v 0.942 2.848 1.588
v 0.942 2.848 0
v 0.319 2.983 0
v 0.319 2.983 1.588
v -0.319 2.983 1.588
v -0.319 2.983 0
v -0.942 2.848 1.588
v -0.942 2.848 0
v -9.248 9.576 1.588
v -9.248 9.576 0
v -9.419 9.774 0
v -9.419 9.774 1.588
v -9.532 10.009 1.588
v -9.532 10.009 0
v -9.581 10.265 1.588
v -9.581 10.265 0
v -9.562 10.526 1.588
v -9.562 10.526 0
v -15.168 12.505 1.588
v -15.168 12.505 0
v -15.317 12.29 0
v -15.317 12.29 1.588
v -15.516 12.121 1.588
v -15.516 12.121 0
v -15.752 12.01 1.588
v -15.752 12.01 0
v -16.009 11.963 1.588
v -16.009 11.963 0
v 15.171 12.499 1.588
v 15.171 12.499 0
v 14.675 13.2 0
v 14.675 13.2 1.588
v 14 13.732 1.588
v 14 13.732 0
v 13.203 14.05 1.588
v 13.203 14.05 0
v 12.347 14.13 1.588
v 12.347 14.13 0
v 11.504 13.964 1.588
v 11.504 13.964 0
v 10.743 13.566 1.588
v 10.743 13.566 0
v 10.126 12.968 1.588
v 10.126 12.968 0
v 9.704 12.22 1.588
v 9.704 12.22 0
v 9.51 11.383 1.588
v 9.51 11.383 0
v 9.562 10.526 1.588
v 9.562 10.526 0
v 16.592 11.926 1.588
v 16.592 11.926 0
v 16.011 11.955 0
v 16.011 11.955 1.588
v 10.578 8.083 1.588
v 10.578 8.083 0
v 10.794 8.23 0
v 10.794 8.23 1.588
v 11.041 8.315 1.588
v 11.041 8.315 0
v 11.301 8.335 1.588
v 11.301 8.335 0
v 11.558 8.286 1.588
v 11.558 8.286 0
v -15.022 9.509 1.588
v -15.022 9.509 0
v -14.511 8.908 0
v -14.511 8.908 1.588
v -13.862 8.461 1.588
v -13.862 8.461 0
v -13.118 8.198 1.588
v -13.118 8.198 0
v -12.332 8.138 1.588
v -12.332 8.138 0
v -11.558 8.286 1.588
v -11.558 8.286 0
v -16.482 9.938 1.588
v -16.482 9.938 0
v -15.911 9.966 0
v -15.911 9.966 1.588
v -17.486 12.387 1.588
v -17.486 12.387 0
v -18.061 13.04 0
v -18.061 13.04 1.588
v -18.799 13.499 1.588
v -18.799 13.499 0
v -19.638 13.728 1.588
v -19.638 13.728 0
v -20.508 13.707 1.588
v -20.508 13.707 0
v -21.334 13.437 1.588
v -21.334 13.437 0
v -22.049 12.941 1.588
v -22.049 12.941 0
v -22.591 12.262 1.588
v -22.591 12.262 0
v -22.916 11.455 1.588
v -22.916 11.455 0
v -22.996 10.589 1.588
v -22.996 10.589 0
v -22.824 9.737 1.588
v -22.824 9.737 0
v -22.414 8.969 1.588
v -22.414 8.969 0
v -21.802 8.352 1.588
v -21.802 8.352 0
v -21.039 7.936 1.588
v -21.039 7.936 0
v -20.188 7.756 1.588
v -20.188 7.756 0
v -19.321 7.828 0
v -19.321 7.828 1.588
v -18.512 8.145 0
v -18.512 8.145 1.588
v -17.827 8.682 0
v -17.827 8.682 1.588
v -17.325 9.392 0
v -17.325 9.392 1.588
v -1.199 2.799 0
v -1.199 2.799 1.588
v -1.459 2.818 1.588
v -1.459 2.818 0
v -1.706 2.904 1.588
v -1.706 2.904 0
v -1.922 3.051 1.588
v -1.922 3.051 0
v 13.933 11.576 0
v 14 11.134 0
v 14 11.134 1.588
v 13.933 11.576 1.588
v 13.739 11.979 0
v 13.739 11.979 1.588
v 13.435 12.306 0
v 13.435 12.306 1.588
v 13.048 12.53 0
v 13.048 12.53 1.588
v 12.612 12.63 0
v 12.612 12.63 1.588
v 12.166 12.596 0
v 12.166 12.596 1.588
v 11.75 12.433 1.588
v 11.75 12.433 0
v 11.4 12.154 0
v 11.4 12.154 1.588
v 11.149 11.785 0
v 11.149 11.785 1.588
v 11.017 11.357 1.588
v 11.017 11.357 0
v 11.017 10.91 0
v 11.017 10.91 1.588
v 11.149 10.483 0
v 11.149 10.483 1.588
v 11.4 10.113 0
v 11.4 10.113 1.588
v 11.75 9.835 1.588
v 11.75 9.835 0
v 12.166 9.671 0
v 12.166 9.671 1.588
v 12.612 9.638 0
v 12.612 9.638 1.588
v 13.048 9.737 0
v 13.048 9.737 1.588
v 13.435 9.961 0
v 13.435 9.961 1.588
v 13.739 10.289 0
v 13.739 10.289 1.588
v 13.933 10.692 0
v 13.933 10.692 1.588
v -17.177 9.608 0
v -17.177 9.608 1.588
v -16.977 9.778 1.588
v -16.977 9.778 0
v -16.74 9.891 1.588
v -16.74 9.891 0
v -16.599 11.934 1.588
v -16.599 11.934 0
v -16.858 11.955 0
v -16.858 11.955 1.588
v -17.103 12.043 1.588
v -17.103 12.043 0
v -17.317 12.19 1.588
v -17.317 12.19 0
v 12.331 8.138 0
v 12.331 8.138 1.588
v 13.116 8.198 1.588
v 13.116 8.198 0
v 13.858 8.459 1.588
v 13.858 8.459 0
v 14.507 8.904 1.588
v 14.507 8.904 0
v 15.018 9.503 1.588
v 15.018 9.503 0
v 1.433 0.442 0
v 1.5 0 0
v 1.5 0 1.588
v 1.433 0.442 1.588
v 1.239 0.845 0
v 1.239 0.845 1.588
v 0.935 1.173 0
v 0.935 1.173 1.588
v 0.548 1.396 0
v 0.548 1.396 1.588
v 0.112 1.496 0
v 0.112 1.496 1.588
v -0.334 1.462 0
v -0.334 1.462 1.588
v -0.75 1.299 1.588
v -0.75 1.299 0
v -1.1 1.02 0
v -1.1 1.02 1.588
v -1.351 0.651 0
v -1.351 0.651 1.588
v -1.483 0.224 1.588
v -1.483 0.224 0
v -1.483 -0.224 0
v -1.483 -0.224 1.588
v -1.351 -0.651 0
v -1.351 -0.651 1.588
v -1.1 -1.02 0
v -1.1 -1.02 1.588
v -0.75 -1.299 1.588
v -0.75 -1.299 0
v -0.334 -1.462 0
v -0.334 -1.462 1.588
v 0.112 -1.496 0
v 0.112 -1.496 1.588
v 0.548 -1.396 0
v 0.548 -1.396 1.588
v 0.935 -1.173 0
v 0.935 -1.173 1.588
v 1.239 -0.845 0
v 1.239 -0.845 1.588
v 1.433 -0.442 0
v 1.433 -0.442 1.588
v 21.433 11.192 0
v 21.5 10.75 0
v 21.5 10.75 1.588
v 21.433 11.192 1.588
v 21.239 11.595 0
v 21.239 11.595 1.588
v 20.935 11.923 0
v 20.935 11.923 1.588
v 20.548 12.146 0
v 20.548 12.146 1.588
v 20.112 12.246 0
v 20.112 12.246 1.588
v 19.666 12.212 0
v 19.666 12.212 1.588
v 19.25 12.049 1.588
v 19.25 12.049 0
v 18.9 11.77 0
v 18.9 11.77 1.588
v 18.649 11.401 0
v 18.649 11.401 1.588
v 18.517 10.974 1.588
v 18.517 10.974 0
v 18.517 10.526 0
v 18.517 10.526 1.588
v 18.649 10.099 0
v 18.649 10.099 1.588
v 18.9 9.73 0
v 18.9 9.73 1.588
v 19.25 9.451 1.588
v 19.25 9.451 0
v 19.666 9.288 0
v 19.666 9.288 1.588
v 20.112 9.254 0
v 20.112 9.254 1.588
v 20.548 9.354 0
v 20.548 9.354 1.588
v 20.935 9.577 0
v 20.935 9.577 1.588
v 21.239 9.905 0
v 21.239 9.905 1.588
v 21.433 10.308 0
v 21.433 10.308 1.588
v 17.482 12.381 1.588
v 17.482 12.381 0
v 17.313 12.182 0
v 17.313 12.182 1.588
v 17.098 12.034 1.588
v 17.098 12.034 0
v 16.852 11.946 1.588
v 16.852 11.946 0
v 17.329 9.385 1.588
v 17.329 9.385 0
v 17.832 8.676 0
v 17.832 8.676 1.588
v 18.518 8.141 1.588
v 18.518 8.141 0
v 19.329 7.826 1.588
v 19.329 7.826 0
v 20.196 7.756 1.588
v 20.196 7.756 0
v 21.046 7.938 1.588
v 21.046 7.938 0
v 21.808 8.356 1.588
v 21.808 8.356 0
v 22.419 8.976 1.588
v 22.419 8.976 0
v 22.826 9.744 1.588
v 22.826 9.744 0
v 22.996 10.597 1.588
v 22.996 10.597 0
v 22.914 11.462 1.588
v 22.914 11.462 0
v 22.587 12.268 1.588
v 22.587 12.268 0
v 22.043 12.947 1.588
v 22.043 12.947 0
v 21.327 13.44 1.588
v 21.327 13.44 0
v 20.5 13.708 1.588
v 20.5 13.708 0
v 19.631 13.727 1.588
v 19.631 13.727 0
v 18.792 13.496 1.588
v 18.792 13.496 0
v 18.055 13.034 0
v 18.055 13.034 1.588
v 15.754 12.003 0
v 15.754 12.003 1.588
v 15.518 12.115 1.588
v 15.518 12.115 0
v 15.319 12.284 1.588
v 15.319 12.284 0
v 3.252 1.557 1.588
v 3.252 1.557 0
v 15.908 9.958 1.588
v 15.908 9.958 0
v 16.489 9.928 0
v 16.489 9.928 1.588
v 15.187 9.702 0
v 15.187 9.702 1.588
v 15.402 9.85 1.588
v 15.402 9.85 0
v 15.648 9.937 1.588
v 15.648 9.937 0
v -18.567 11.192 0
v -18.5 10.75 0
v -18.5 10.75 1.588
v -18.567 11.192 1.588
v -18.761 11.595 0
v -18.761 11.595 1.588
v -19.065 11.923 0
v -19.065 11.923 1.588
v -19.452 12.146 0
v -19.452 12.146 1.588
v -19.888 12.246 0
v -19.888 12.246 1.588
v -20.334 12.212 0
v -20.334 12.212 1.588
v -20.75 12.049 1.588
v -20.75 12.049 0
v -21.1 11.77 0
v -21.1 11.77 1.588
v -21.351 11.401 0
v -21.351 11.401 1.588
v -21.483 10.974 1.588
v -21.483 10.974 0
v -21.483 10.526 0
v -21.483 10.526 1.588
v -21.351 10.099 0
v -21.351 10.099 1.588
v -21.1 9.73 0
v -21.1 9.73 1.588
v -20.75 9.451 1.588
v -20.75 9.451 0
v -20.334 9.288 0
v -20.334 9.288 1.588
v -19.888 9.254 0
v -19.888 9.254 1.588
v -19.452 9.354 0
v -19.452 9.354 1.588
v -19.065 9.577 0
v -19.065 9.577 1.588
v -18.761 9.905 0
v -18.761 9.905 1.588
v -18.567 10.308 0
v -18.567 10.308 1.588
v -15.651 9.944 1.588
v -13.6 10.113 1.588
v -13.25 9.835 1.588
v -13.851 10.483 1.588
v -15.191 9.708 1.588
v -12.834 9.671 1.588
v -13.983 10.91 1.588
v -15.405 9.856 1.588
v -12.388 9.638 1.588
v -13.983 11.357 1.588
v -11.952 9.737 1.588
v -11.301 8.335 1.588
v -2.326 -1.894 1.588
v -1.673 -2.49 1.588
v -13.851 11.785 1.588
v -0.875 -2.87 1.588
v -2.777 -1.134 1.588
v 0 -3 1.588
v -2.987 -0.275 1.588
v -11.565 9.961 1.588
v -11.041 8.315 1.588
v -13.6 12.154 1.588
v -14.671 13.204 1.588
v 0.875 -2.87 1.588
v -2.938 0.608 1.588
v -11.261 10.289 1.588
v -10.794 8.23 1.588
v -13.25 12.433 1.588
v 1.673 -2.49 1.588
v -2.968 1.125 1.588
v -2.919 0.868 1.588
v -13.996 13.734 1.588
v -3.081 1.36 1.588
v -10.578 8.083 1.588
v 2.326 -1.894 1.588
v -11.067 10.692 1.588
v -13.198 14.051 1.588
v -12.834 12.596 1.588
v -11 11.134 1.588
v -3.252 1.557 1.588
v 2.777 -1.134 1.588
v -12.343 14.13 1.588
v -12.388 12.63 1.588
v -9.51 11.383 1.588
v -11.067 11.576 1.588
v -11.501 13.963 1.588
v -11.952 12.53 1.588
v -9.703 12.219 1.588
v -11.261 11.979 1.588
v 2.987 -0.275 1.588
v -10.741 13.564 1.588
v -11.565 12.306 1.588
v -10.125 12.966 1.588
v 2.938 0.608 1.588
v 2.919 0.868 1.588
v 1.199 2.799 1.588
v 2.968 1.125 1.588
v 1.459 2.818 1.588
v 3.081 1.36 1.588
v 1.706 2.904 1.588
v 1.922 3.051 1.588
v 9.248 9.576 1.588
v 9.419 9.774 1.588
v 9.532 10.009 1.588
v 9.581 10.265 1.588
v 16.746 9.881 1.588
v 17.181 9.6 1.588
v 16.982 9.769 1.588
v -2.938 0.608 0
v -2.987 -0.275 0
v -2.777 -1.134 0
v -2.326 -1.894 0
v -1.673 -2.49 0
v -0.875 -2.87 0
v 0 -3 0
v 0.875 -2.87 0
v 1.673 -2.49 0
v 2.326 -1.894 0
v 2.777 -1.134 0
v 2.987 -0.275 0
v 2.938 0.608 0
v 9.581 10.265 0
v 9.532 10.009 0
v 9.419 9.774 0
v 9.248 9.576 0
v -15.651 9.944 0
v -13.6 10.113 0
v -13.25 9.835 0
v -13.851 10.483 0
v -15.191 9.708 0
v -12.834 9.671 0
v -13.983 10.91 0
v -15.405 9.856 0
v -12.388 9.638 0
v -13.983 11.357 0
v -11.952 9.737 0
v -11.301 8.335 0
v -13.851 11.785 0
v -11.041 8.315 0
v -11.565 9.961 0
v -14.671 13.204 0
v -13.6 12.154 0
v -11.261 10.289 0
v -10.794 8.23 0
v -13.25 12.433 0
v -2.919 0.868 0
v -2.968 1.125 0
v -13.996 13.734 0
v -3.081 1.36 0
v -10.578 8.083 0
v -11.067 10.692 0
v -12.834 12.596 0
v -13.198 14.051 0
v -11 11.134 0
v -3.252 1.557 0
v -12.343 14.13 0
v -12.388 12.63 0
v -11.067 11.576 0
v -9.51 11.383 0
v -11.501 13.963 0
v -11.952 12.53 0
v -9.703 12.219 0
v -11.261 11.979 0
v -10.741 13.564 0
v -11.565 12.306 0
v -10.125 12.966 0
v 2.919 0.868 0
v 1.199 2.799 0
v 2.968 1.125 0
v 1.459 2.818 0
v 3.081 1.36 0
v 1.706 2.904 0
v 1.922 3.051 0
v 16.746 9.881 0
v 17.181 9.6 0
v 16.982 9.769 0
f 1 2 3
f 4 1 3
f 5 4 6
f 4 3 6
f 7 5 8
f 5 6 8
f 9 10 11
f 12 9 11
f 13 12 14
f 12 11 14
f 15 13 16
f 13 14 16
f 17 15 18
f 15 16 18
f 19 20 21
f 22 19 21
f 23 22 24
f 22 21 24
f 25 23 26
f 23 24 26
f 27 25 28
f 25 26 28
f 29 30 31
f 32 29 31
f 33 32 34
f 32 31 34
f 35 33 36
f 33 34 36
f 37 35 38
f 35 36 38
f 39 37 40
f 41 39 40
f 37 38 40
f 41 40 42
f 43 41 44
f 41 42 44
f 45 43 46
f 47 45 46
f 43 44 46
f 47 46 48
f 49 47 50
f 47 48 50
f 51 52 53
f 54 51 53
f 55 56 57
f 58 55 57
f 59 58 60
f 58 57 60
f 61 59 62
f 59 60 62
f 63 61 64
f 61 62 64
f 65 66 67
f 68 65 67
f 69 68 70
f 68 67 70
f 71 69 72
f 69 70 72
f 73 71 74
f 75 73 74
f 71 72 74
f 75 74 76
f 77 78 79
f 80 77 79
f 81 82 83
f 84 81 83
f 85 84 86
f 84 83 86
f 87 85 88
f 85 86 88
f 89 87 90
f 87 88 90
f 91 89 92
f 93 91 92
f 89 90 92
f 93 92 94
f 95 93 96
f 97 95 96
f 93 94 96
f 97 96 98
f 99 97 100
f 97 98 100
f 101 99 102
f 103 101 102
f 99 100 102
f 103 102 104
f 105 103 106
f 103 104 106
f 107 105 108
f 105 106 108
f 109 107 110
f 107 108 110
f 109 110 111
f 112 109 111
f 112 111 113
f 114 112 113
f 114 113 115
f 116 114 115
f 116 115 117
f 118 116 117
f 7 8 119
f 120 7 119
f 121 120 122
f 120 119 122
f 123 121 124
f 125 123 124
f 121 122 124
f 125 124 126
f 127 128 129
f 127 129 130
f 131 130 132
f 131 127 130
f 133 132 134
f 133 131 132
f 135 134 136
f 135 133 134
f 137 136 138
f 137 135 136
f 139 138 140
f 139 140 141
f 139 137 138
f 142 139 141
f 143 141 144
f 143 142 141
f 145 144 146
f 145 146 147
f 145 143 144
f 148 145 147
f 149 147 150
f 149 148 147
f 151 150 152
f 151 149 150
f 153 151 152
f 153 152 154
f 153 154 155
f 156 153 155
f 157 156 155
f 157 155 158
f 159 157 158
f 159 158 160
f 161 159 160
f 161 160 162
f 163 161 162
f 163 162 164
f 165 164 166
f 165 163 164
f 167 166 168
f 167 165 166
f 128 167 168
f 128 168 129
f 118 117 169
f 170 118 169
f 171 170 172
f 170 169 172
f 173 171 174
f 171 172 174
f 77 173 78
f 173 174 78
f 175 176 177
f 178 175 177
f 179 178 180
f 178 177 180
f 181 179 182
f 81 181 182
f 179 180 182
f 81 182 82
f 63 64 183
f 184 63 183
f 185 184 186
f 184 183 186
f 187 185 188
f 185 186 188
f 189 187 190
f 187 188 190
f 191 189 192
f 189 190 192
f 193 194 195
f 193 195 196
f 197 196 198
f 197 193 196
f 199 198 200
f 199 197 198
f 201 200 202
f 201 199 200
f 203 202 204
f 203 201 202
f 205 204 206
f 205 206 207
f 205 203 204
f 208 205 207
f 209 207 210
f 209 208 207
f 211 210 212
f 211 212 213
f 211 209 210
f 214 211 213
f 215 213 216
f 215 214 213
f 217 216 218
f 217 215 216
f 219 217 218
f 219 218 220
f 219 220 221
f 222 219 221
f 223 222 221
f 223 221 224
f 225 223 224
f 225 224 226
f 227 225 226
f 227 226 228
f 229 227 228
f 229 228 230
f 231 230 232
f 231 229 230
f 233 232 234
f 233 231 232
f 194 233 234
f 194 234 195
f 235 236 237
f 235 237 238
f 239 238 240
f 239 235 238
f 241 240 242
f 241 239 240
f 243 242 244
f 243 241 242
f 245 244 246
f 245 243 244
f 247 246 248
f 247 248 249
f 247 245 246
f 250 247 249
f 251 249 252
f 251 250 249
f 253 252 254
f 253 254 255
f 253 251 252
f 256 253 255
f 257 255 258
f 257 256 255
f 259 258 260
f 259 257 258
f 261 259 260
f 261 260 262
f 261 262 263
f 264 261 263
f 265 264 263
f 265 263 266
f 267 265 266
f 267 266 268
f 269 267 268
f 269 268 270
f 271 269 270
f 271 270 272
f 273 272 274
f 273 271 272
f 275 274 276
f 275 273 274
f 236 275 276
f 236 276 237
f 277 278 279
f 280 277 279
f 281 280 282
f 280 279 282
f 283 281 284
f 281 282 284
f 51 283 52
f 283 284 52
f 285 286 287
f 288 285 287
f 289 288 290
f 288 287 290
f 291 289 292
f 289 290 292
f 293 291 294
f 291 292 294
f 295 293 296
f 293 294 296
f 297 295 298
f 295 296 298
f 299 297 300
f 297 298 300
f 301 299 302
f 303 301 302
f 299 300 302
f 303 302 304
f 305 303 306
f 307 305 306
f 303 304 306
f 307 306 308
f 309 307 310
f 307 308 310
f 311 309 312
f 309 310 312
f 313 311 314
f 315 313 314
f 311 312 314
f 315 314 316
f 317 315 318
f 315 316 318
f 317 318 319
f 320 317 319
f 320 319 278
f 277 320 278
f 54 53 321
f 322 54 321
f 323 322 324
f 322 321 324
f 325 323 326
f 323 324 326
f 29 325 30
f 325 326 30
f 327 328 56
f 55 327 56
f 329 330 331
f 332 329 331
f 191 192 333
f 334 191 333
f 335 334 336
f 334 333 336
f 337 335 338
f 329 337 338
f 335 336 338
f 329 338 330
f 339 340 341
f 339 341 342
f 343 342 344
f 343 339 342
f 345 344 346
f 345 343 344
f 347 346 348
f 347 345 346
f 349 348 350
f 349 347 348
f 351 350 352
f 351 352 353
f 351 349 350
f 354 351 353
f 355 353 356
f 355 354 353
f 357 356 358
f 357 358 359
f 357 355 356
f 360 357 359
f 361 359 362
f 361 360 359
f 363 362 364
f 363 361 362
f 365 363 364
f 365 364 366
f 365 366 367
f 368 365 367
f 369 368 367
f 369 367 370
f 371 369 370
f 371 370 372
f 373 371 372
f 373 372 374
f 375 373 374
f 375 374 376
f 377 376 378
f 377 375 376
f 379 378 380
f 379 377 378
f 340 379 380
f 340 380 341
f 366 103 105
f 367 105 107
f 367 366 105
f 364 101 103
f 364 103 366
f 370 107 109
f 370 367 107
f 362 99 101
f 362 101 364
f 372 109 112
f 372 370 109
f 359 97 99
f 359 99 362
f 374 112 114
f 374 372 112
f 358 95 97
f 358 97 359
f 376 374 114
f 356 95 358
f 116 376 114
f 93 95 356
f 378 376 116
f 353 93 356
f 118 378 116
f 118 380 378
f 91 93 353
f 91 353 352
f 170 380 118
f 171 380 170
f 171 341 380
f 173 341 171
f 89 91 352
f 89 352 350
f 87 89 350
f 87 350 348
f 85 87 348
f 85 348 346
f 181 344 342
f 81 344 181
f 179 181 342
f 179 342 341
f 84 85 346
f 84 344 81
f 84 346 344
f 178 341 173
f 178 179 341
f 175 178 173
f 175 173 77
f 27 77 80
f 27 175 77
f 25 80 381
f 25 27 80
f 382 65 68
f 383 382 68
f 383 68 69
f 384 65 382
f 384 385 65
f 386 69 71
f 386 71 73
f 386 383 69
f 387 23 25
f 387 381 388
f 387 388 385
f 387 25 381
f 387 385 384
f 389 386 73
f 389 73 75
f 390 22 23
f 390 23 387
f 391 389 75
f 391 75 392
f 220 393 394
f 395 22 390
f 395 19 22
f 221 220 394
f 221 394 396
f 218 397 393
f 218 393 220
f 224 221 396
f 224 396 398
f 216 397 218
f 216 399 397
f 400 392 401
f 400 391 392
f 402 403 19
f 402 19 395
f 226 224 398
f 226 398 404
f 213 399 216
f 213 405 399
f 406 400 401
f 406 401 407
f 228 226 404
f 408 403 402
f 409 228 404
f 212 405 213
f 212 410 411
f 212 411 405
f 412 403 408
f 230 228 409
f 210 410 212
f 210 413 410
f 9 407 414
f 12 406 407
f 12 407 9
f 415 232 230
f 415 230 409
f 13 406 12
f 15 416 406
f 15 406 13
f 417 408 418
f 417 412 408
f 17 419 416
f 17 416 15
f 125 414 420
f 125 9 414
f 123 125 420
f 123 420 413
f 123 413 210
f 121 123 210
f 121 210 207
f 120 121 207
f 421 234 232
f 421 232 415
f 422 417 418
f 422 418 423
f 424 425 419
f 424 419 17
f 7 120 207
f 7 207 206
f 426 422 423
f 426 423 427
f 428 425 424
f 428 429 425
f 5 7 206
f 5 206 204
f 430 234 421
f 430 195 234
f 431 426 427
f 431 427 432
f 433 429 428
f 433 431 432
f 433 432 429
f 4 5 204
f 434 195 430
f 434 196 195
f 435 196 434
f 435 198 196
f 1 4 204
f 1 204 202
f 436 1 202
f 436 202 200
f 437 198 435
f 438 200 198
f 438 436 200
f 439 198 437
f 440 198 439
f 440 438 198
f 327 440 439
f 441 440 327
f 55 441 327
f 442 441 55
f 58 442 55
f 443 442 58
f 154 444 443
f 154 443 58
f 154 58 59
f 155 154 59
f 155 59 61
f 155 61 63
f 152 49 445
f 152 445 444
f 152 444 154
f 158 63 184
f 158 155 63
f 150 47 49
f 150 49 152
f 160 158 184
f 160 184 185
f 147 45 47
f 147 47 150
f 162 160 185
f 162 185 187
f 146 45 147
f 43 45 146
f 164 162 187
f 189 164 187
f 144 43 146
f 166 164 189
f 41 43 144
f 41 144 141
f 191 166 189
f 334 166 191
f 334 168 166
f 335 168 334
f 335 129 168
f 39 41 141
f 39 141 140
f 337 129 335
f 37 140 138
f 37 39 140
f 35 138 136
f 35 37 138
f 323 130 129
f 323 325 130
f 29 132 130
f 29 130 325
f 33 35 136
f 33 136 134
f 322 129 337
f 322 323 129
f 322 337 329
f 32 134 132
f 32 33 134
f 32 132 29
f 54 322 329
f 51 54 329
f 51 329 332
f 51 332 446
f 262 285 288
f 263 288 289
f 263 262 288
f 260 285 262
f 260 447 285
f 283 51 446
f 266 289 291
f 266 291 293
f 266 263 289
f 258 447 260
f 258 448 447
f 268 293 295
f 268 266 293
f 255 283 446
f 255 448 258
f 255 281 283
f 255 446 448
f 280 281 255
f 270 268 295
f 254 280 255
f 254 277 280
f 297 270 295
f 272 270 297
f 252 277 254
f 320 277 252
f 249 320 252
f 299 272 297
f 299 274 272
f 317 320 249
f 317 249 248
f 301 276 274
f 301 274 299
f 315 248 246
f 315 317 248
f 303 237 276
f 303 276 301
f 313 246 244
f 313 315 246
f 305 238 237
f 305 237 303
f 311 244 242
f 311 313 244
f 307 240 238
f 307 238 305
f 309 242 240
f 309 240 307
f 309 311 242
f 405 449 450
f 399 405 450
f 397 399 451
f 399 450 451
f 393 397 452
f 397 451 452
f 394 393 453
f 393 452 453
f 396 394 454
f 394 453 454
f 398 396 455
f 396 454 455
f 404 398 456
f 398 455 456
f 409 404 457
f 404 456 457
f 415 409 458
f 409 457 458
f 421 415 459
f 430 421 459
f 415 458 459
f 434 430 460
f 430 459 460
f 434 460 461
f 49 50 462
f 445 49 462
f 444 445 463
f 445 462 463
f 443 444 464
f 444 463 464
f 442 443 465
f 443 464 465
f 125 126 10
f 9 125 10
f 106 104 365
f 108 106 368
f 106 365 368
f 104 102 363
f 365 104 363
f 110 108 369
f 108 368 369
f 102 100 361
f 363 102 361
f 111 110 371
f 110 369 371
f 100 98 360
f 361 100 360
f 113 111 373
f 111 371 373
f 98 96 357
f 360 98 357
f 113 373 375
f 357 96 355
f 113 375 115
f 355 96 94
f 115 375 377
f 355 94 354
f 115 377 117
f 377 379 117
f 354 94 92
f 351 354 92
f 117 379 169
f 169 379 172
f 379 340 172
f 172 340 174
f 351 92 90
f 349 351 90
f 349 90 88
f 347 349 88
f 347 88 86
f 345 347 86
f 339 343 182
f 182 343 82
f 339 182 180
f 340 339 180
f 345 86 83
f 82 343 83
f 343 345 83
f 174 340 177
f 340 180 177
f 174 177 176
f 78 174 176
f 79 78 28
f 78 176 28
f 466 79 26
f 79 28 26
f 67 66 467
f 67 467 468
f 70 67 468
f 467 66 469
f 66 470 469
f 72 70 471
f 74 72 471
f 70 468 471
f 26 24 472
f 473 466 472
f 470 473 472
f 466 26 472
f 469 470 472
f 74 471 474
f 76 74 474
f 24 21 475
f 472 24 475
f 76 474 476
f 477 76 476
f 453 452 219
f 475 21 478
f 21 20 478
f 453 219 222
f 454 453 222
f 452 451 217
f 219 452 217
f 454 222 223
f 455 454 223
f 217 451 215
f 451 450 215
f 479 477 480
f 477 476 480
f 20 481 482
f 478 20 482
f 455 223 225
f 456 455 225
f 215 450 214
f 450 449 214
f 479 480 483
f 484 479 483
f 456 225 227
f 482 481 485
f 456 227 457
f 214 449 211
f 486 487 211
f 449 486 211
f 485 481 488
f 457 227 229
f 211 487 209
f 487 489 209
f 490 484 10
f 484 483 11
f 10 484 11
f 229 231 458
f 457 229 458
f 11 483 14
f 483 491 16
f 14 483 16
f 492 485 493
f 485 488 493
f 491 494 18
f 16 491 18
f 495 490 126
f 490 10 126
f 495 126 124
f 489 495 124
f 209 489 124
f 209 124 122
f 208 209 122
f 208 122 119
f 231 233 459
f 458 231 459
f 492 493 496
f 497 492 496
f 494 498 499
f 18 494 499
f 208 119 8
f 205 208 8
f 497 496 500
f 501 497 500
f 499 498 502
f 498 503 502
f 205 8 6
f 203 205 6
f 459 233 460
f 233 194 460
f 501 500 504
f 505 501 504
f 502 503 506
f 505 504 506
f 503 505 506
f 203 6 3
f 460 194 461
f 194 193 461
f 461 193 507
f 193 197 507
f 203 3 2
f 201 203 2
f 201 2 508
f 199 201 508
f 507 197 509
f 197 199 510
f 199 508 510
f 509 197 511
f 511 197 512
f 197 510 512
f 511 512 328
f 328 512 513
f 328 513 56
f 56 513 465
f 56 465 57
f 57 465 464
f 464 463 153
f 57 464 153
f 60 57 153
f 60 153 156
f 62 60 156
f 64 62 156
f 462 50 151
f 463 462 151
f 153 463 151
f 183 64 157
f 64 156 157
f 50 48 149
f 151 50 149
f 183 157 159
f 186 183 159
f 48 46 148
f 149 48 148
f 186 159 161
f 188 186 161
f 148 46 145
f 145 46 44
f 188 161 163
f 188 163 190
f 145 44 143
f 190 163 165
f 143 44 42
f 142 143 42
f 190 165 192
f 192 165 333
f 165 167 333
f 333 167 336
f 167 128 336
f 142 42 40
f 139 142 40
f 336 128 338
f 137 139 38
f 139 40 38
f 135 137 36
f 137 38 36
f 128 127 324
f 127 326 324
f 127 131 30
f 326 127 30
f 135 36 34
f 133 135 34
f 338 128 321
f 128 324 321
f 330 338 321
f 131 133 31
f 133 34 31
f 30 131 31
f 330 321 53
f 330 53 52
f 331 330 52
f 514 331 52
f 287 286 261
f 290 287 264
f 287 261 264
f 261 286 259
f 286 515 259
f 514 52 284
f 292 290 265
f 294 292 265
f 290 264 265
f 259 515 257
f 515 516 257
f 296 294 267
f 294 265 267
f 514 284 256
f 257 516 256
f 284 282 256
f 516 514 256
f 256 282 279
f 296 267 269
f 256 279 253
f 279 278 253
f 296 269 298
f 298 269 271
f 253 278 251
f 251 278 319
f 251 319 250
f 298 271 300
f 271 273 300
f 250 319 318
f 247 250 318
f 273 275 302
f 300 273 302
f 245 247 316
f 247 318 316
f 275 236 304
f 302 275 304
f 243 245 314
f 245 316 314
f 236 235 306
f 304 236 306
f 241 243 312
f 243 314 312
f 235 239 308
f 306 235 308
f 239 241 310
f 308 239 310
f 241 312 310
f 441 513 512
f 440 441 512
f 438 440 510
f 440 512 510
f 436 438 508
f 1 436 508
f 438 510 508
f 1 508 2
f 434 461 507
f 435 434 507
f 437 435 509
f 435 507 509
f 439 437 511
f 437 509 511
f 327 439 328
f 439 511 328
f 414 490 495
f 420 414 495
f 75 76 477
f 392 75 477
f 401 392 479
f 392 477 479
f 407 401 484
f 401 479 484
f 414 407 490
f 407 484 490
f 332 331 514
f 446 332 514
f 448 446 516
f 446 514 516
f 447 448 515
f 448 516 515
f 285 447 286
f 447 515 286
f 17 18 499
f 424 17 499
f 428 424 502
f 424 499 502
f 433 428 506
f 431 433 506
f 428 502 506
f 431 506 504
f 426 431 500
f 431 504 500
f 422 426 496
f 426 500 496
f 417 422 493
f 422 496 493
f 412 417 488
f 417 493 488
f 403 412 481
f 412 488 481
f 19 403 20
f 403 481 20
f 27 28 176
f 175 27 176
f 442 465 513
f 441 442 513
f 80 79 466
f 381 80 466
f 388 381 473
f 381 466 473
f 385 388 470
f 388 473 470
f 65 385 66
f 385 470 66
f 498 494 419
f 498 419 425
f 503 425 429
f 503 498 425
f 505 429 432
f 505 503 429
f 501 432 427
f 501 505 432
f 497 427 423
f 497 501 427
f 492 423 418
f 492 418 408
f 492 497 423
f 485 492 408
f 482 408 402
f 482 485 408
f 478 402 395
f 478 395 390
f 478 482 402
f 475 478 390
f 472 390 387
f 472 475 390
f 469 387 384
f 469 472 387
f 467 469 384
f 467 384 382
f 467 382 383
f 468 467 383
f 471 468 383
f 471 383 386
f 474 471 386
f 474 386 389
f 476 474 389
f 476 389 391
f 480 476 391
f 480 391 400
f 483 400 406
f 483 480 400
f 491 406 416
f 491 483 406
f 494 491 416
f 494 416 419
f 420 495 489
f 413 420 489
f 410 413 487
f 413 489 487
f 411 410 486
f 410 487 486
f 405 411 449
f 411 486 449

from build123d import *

# Parameters (mm, degrees)
SKETCH4_R           = 1.5
SKETCH4_R_2         = 1.500000001
SKETCH4_R_3         = 1.499999998
BOSS_EXTRUDE2_DEPTH = 1.5875


with BuildPart() as part:
    # Sketch4 → Boss-Extrude2 (new body)
    with BuildSketch(Plane.XY):
        with BuildLine():
            Line((-1.921662056, 3.050772843), (-9.248103317, 9.576404551))
            ThreePointArc((-9.248103317, 9.576404551), (-9.532363934, 10.009007248), (-9.562239502, 10.525782482))
            ThreePointArc((-9.562239502, 10.525782482), (-11.501295907, 13.962584592), (-15.168282223, 12.504928996))
            ThreePointArc((-15.168282223, 12.504928996), (-15.515981129, 12.121451925), (-16.008835749, 11.963200494))
            Line((-16.008835749, 11.963200494), (-16.599403965, 11.934302598))
            ThreePointArc((-16.599403965, 11.934302598), (-17.103207742, 12.042580302), (-17.486208385, 12.387330667))
            ThreePointArc((-17.486208385, 12.387330667), (-22.995673813, 10.588945924), (-17.32515244, 9.391622098))
            ThreePointArc((-17.32515244, 9.391622098), (-16.977285242, 9.77807758), (-16.482410468, 9.937634422))
            Line((-16.482410468, 9.937634422), (-15.911087986, 9.965590578))
            ThreePointArc((-15.911087986, 9.965590578), (-15.405137648, 9.856213028), (-15.021660578, 9.508514122))
            ThreePointArc((-15.021660578, 9.508514122), (-13.498704093, 8.304814666), (-11.557591443, 8.285565834))
            ThreePointArc((-11.557591443, 8.285565834), (-11.040816209, 8.315441402), (-10.578337944, 8.082926785))
            Line((-10.578337944, 8.082926785), (-3.251896683, 1.557295078))
            ThreePointArc((-3.251896683, 1.557295078), (-2.967636066, 1.124692381), (-2.937760498, 0.607917146))
            ThreePointArc((-2.937760498, 0.607917146), (0, -3), (2.937760498, 0.607917146))
            ThreePointArc((2.937760498, 0.607917146), (2.967636066, 1.124692381), (3.251896683, 1.557295078))
            Line((3.251896683, 1.557295078), (10.578337944, 8.082926785))
            ThreePointArc((10.578337944, 8.082926785), (11.040816209, 8.315441402), (11.557591443, 8.285565834))
            ThreePointArc((11.557591443, 8.285565834), (13.495560549, 8.303706839), (15.01804315, 9.502914943))
            ThreePointArc((15.01804315, 9.502914943), (15.40229187, 9.849760895), (15.908483998, 9.958013941))
            Line((15.908483998, 9.958013941), (16.48932974, 9.928297901))
            ThreePointArc((16.48932974, 9.928297901), (16.981831505, 9.768951725), (17.328677456, 9.384703006))
            ThreePointArc((17.328677456, 9.384703006), (22.996081677, 10.596720608), (17.481956847, 12.380784685))
            ThreePointArc((17.481956847, 12.380784685), (17.097708128, 12.033938733), (16.591516, 11.925685687))
            Line((16.591516, 11.925685687), (16.010670258, 11.955401727))
            ThreePointArc((16.010670258, 11.955401727), (15.518168493, 12.114747903), (15.171322541, 12.498996622))
            ThreePointArc((15.171322541, 12.498996622), (11.504439451, 13.963692419), (9.562239502, 10.525782482))
            ThreePointArc((9.562239502, 10.525782482), (9.532363934, 10.009007248), (9.248103317, 9.576404551))
            Line((9.248103317, 9.576404551), (1.921662056, 3.050772843))
            ThreePointArc((1.921662056, 3.050772843), (1.459183791, 2.818258227), (0.942408557, 2.848133795))
            ThreePointArc((0.942408557, 2.848133795), (0, 3), (-0.942408557, 2.848133795))
            ThreePointArc((-0.942408557, 2.848133795), (-1.459183791, 2.818258227), (-1.921662056, 3.050772843))
        make_face()
        with Locations((-12.5, 11.133699629)):
            Circle(SKETCH4_R, mode=Mode.SUBTRACT)
        with Locations((-20.000000001, 10.750000001)):
            Circle(SKETCH4_R_2, mode=Mode.SUBTRACT)
        Circle(SKETCH4_R, mode=Mode.SUBTRACT)
        with Locations((12.5, 11.133699629)):
            Circle(SKETCH4_R, mode=Mode.SUBTRACT)
        with Locations((19.999999998, 10.749999999)):
            Circle(SKETCH4_R_3, mode=Mode.SUBTRACT)
    extrude(amount=BOSS_EXTRUDE2_DEPTH)


solid = part.part
